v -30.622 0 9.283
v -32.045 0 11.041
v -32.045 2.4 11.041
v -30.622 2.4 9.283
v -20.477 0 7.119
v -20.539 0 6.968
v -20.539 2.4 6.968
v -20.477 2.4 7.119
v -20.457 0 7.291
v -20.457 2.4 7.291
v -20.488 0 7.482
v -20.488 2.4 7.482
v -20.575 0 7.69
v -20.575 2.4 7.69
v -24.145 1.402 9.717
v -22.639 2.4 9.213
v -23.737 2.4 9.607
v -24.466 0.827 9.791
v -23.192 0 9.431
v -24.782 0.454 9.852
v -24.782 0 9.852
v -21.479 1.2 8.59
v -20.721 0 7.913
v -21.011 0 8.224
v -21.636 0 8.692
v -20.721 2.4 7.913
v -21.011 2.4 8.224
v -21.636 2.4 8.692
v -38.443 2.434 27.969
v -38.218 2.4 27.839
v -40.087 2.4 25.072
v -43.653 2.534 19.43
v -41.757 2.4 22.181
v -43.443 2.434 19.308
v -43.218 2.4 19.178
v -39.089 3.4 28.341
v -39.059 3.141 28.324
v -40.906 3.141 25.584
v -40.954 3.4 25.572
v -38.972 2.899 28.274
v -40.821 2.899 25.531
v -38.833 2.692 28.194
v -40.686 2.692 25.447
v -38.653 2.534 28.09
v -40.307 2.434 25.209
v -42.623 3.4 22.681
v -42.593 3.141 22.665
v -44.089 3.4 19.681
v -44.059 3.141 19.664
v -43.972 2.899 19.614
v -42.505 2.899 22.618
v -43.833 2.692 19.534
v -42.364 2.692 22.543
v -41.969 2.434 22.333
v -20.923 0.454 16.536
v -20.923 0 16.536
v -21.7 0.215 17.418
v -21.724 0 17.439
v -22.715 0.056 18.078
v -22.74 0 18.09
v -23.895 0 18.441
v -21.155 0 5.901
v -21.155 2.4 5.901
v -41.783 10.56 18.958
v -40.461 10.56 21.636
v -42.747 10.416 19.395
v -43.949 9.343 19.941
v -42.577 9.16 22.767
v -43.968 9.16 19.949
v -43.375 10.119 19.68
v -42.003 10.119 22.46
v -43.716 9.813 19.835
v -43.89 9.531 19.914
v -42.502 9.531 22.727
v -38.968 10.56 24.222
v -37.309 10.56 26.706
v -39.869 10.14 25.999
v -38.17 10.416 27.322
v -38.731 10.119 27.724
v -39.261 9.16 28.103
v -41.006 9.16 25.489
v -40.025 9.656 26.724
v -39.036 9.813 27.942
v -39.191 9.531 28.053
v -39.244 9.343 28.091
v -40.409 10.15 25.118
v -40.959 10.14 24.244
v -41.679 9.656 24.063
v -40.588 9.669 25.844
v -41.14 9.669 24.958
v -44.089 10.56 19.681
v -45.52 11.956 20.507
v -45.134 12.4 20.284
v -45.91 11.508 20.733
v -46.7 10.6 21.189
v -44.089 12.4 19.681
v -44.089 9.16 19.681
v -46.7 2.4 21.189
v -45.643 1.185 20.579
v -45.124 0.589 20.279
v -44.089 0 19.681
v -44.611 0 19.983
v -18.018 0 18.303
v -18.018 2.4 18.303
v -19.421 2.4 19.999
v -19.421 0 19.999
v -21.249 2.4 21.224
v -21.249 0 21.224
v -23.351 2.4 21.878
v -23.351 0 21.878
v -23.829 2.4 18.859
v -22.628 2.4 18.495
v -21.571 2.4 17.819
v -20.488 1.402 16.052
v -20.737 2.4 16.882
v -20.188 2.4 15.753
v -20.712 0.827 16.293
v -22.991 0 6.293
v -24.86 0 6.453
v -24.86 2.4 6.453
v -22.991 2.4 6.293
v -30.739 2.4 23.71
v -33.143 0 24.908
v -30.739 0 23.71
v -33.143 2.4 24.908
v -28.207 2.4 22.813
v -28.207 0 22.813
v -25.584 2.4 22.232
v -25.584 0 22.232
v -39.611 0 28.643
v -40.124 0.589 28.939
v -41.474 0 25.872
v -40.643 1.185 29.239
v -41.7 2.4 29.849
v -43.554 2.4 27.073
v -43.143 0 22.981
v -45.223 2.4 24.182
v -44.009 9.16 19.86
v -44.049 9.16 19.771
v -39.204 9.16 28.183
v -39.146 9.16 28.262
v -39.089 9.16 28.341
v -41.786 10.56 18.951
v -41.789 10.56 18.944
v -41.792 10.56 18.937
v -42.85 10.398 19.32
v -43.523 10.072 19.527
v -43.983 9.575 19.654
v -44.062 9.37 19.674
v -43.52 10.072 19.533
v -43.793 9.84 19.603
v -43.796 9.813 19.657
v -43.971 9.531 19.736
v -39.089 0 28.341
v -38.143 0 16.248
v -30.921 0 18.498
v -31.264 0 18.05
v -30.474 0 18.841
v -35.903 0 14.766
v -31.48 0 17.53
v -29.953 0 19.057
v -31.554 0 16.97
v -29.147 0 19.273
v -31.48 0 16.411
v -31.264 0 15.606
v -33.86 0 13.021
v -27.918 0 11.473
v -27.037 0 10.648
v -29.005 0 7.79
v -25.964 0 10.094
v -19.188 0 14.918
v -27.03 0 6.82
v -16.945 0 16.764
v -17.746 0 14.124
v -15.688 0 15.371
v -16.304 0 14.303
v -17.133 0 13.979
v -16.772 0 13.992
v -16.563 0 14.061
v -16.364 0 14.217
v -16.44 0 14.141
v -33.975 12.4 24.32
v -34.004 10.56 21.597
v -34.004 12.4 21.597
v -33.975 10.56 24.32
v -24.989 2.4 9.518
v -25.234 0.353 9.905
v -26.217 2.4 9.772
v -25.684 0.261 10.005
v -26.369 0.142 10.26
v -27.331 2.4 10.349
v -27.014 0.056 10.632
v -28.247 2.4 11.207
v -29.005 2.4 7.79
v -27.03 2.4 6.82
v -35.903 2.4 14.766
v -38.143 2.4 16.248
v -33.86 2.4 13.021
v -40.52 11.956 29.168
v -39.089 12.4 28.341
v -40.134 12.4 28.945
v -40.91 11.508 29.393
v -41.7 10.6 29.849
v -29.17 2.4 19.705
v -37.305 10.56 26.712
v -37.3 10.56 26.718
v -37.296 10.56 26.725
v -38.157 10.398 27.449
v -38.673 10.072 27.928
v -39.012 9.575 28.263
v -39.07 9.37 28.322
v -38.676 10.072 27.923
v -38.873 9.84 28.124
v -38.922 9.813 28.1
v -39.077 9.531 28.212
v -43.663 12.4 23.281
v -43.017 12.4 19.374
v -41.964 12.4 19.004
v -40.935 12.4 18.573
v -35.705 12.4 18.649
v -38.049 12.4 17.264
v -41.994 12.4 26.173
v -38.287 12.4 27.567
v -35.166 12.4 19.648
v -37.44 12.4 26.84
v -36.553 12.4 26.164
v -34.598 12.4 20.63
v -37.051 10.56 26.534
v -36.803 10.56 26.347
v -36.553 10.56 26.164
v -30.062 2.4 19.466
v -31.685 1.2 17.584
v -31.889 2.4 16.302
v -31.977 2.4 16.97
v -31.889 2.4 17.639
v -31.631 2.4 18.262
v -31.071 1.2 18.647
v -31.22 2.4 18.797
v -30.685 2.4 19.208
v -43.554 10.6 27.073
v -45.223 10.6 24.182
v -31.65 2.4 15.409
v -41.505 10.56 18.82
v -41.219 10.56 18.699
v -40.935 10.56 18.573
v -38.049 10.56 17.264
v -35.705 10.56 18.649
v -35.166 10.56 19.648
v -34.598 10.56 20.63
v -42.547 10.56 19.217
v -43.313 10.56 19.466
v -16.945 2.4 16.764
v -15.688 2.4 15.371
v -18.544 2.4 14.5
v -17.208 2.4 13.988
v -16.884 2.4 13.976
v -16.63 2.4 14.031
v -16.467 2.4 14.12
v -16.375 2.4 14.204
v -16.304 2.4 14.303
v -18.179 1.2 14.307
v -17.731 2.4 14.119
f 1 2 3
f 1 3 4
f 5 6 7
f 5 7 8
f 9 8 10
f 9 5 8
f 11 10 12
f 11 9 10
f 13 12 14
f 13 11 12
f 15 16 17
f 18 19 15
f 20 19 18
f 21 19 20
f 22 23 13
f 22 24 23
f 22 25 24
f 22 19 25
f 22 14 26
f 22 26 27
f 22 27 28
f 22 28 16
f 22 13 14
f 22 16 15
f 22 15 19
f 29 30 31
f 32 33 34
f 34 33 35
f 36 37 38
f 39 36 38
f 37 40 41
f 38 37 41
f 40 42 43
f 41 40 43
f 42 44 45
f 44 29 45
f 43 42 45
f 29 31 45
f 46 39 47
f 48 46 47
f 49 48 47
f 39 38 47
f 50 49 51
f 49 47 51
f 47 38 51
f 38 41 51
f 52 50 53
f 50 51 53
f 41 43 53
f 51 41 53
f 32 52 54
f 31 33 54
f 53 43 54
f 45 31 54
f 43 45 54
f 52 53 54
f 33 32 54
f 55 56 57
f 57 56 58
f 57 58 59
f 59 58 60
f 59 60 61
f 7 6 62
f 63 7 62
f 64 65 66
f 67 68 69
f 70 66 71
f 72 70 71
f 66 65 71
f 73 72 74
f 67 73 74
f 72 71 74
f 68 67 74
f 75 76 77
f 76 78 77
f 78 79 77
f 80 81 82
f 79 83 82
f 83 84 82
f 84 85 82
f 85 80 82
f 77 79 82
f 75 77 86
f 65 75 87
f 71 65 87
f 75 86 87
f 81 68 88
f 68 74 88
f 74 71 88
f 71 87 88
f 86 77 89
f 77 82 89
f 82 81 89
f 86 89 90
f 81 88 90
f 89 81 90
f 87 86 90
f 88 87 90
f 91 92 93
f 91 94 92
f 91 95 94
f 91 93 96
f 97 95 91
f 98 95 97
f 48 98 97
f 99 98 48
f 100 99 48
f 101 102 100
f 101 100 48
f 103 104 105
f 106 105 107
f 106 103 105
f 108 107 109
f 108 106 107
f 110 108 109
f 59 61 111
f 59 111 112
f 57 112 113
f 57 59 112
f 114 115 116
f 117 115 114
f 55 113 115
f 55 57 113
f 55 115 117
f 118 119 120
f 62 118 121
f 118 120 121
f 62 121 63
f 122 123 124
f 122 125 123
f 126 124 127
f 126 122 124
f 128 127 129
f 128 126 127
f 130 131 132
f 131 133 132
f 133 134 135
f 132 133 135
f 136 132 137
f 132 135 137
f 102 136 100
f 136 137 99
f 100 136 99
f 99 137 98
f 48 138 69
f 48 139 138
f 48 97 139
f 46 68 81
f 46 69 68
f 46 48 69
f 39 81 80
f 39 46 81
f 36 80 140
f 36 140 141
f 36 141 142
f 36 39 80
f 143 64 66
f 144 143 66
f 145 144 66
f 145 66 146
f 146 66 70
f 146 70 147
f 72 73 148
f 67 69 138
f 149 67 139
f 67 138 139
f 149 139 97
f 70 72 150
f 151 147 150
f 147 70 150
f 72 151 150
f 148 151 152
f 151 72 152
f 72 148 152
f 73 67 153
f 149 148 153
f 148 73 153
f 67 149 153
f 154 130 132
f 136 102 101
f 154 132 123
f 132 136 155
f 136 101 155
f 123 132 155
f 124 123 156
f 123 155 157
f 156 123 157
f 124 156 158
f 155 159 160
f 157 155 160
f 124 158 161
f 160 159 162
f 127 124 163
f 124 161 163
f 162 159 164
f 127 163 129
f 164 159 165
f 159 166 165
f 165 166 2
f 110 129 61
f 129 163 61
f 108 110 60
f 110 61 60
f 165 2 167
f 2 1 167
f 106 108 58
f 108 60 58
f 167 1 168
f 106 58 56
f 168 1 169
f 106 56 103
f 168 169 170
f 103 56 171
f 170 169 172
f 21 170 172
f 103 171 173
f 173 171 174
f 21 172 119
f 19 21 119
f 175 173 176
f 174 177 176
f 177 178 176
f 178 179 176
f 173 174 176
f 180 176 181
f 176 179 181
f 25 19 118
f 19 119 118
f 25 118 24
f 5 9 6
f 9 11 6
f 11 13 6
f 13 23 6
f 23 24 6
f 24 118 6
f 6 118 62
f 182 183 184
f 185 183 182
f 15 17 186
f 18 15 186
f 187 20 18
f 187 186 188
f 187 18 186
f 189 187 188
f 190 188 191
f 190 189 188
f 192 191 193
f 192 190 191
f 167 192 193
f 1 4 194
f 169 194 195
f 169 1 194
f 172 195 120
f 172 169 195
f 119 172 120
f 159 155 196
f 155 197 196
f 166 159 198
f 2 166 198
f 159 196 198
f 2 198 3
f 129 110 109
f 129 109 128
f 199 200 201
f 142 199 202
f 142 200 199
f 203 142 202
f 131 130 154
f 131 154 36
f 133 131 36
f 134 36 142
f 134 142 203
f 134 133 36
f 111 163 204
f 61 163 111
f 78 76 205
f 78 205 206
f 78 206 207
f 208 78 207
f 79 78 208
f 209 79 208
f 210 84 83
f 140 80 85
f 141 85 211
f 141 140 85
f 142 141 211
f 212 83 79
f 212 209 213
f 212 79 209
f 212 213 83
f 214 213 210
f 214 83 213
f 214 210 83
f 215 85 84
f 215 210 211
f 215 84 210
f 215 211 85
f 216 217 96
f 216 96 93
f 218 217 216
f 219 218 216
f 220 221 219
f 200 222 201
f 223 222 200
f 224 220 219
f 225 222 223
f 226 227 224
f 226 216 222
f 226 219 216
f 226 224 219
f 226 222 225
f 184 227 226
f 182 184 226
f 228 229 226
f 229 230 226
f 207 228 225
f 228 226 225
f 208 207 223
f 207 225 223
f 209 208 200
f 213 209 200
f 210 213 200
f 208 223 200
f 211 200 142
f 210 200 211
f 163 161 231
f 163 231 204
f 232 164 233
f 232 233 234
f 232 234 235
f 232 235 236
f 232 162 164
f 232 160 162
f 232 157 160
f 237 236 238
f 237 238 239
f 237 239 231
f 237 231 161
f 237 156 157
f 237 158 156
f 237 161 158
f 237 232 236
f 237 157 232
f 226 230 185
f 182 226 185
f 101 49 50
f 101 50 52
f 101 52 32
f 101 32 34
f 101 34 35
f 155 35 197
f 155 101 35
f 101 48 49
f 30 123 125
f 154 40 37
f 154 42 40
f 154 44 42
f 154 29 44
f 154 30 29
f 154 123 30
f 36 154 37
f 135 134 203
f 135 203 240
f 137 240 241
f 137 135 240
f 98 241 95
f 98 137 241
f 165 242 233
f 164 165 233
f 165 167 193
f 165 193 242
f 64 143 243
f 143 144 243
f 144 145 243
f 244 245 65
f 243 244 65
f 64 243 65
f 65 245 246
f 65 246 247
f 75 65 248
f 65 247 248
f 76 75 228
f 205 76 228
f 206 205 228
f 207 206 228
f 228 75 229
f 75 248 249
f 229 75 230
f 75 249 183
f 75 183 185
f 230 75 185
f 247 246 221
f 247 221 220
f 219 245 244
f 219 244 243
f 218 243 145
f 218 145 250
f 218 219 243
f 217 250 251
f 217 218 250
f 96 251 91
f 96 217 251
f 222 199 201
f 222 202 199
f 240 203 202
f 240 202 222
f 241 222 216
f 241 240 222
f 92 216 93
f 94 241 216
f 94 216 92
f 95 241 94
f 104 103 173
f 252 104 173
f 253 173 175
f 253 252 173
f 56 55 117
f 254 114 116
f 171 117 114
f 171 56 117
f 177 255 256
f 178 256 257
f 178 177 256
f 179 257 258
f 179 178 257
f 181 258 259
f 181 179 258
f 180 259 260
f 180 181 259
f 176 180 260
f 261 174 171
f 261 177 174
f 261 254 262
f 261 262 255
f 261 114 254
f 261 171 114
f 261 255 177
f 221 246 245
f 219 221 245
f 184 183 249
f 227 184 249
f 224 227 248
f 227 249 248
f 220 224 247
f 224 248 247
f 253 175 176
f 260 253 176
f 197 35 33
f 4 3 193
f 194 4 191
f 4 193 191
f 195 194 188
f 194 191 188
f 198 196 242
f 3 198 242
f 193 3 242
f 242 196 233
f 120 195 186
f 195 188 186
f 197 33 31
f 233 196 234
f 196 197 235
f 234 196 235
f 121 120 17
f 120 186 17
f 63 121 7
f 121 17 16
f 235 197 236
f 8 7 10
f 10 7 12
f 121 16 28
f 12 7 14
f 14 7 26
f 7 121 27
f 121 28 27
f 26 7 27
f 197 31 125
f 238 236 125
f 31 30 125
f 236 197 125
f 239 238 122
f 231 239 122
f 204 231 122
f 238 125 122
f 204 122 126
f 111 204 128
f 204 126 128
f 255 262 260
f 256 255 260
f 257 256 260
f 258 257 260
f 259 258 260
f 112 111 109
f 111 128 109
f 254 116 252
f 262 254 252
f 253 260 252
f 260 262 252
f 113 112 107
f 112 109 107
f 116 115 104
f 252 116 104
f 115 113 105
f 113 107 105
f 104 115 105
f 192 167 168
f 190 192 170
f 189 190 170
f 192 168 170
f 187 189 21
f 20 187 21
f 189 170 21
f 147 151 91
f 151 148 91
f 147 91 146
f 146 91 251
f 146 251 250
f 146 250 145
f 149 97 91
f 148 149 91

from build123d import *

# Parameters (mm, degrees)
EXTRUDE_1_DEPTH     = 2.4
EXTRUDE_1_DRAFT     = 10
EXTRUDE_2_DEPTH     = 12.4
EXTRUDE_4_DEPTH     = 2.4
EXTRUDE_START       = -1.84
EXTRUDE_3_DEPTH     = 1.84
CHAMFER_1_SIZE      = 2.4
FILLET_3_R          = 1
FILLET_4_R          = 19
CHAMFER_2_SIZE      = 1.5
CHAMFER_3_SIZE      = 1.5
FILLET_5_SIZE       = 2.4
FILLET_5_SIZE_2     = 1.4
FILLET_8_R          = 15
CUT_EXTRUDE_2_DEPTH = 5
FILLET_6_DEPTH      = 2.4
FILLET_7_DEPTH      = 2.4
CHAMFER_4_SIZE      = 1.8
FILLET_9_R          = 22


with BuildPart() as part:
    # 草图1 → 凸台-拉伸1 (with draft: the straight prism first)
    with BuildSketch(Plane(origin=(0, 0, 0), x_dir=(1, 0, 0), z_dir=(0, 1, 0))):
        with BuildLine():
            Line((-8, -10.392304845), (-13, -1.732050808))
            Line((-13, -1.732050808), (-21.967816979, -6.909622355))
            Line((-21.967816979, -6.909622355), (-22.707395472, -6.711455524))
            ThreePointArc((-22.707395472, -6.711455524), (-27.045667208, -6.825066474), (-30.622176838, -9.283132374))
            Line((-30.622176838, -9.283132374), (-34.43427487, -13.990668154))
            Line((-34.43427487, -13.990668154), (-34.611399325, -14.209398026))
            Line((-34.611399325, -14.209398026), (-44.088841542, -19.681201841))
            ThreePointArc((-44.088841542, -19.681201841), (-41.813654956, -24.141124945), (-39.088841542, -28.341455878))
            Line((-39.088841542, -28.341455878), (-29.611399325, -22.869652063))
            Line((-29.611399325, -22.869652063), (-29.333411472, -22.825622721))
            Line((-29.333411472, -22.825622721), (-23.350516885, -21.878016874))
            ThreePointArc((-23.350516885, -21.878016874), (-19.433514554, -20.009701627), (-17.165988715, -16.309453567))
            Line((-17.165988715, -16.309453567), (-16.967816979, -15.569876393))
            Line((-16.967816979, -15.569876393), (-8, -10.392304845))
        make_face()
        with BuildLine():
            Line((-27.917710858, -11.473169763), (-31.264303283, -15.605855609))
            Line((-31.264303283, -15.605855609), (-31.480162481, -16.411447438))
            ThreePointArc((-31.480162481, -16.411447438), (-31.264379417, -18.05049777), (-29.952811807, -19.056896659))
            Line((-29.952811807, -19.056896659), (-29.147219046, -19.27275307))
            Line((-29.147219046, -19.27275307), (-23.894912088, -18.440861966))
            ThreePointArc((-23.894912088, -18.440861966), (-21.762087, -17.423555776), (-20.527408298, -15.408754734))
            Line((-20.527408298, -15.408754734), (-19.958845574, -13.286877913))
            ThreePointArc((-19.958845574, -13.286877913), (-20.174626779, -11.647826039), (-21.486196869, -10.641428268))
            Line((-21.486196869, -10.641428268), (-23.608077089, -10.07287972))
            ThreePointArc((-23.608077089, -10.07287972), (-25.97028529, -10.134742248), (-27.917710858, -11.473169763))
        make_face(mode=Mode.SUBTRACT)
    extrude(amount=EXTRUDE_1_DEPTH)
    # 凸台-拉伸1: the draft: its side faces are tilted about the plane it starts from
    extrude_1_sides = [part.faces().sort_by_distance(p)[0] for p in [
        (-26.480958105, 1.2, 22.373834469),
        (-29.59100707, 1.2, 13.539512686),
        (-31.372232882, 1.2, 16.008651523),
        (-31.264379417, 1.2, 18.05049777),
        (-29.550015427, 1.2, 19.164824864),
        (-26.521065567, 1.2, 18.856807518),
        (-21.762087, 1.2, 17.423555776),
        (-20.243126936, 1.2, 14.347816323),
        (-20.174626779, 1.2, 11.647826039),
        (-22.547136979, 1.2, 10.357153994),
        (-25.97028529, 1.2, 10.134742248),
        (-41.813654956, 1.2, 24.141124945),
        (-39.350120434, 1.2, 16.945299933),
        (-32.616788082, 1.2, 11.7462652),
        (-27.045667208, 1.2, 6.825066474),
        (-22.337606226, 1.2, 6.810538939),
        (-17.48390849, 1.2, 4.320836581),
        (-10.5, 1.2, 6.062177826),
        (-12.48390849, 1.2, 12.981090619),
        (-17.066902847, 1.2, 15.93966498),
        (-34.350120433, 1.2, 25.605553971),
        (-19.433514554, 1.2, 20.009701627),
    ]]
    draft(extrude_1_sides, Plane(origin=(0, 0, 0), x_dir=(1, 0, 0), z_dir=(0, 1, 0)), EXTRUDE_1_DRAFT)



with BuildPart() as body_2:
    # 草图3 → 凸台-拉伸2 (new body)
    with BuildSketch(Plane.XZ):
        with BuildLine():
            Line((-39.088841542, 28.341455878), (-41.700134223, 29.849086411))
            ThreePointArc((-41.700134223, 29.849086411), (-44.411731167, 25.641124945), (-46.700134223, 21.188832373))
            Line((-46.700134223, 21.188832373), (-44.088841542, 19.681201841))
            ThreePointArc((-44.088841542, 19.681201841), (-41.813654956, 24.141124945), (-39.088841542, 28.341455878))
        make_face()
    extrude(amount=-EXTRUDE_2_DEPTH)


with BuildPart() as part_1:
    add(part.part)

    add(body_2.part)  # 凸台-拉伸4 merges body 2
    # 草图2 → 凸台-拉伸4 (add)
    with BuildSketch(Plane.XZ):
        with BuildLine():
            Line((-13, 1.732050808), (-8, 10.392304845))
            Line((-8, 10.392304845), (-16.967816979, 15.569876393))
            Line((-16.967816979, 15.569876393), (-17.165988715, 16.309453567))
            ThreePointArc((-17.165988715, 16.309453567), (-19.433514554, 20.009701627), (-23.350516885, 21.878016874))
            Line((-23.350516885, 21.878016874), (-29.611399325, 22.869652063))
            Line((-29.611399325, 22.869652063), (-39.088841542, 28.341455878))
            ThreePointArc((-39.088841542, 28.341455878), (-41.813654956, 24.141124945), (-44.088841542, 19.681201841))
            Line((-44.088841542, 19.681201841), (-34.611399325, 14.209398026))
            Line((-34.611399325, 14.209398026), (-30.622176838, 9.283132374))
            ThreePointArc((-30.622176838, 9.283132374), (-27.045667208, 6.825066474), (-22.707395472, 6.711455524))
            Line((-22.707395472, 6.711455524), (-21.967816979, 6.909622355))
            Line((-21.967816979, 6.909622355), (-13, 1.732050808))
        make_face()
        Polygon((-28.267922288, 9.695660603), (-32.994912051, 15.569876392), (-31.812956682, 19.594100966), (-26.346816011, 20.919608689), (-19.040272004, 17.121163853), (-18.489608424, 9.956624946), (-26.72941961, 8.295337377), align=None, mode=Mode.SUBTRACT)
    extrude(amount=-EXTRUDE_4_DEPTH)

    # 草图4 → 凸台-拉伸3 (add)
    with BuildSketch(Plane(origin=(0, 12.4, 0), x_dir=(1, 0, 0), z_dir=(0, 1, 0)).offset(EXTRUDE_START)):
        with BuildLine():
            Line((-36.682994227, -16.643845431), (-46.700134223, -21.188832373))
            ThreePointArc((-46.700134223, -21.188832373), (-44.411731167, -25.641124945), (-41.700134223, -29.849086411))
            Line((-41.700134223, -29.849086411), (-32.755490073, -23.446482172))
            ThreePointArc((-32.755490073, -23.446482172), (-34.885451726, -20.141124945), (-36.682994227, -16.643845431))
        make_face()
    extrude(amount=EXTRUDE_3_DEPTH)

    # 倒角1
    chamfer_1_edges = [part_1.edges().sort_by_distance(p)[0] for p in [
        (-44.411731167, 0, 25.641124945),
    ]]
    chamfer(chamfer_1_edges, length=CHAMFER_1_SIZE)

    # 圆角3
    fillet_3_edges = [part_1.edges().sort_by_distance(p)[0] for p in [
        (-41.813654956, 2.4, 24.141124945),
    ]]
    fillet(fillet_3_edges, radius=FILLET_3_R)

    # 圆角4
    # the kernel refuses this fillet: 19 mm, written as the material it adds along each edge
    with BuildSketch(Plane(origin=(-39.260685818, 12.4, 28.102921618), x_dir=(0.5845278463012991, 0, 0.8113736481414496), z_dir=(0, -1, 0))) as fillet_4_piece_1:
        with BuildLine():
            CenterArc((19.010051021, -3.272459571), FILLET_4_R, 170.082224445, 10.092211377)
            Line((0.010139075, -3.33030459), (0, 0))
            ThreePointArc((0, 0), (0.146994089, 0.00022376), (0.293988178, 0))
        make_face()
    extrude(amount=1.84)
    with BuildSketch(Plane(origin=(-43.968186951, 12.4, 19.949290479), x_dir=(-0.4104062681012657, 0, -0.9119027881869821), z_dir=(0, -1, 0))) as fillet_4_piece_2:
        with BuildLine():
            CenterArc((19.010051021, 3.272459571), FILLET_4_R, 179.825564179, 10.092211377)
            Line((0.010139075, 3.33030459), (0, 0))
            ThreePointArc((0, 0), (0.146994089, -0.00022376), (0.293988178, 0))
        make_face()
    extrude(amount=1.84)

    # 倒角2
    # the kernel refuses this chamfer: 2.14222201, 1.5 mm, written as the material it takes off along each edge
    with BuildSketch(Plane(origin=(-36.682994227, 4.801632278, 16.643845431), x_dir=(-0.910649090537952, 0, 0.4131806310833085), z_dir=(0, 1, 0))) as chamfer_2_piece_1:
        with BuildLine():
            Line((CHAMFER_2_SIZE, 0), (-0.061799745, 2.230481193))
            ThreePointArc((-0.061799745, 2.230481193), (-0.016460271, 1.151452368), (0, 0))
            Line((0, 0), (CHAMFER_2_SIZE, 0))
        make_face()
    extrude(amount=13.356735445, mode=Mode.SUBTRACT)

    # 倒角3
    # the kernel refuses this chamfer: 2.14222201, 1.5 mm, written as the material it takes off along each edge
    with BuildSketch(Plane(origin=(-32.755490073, 4.801632278, 23.446482172), x_dir=(-0.5593104278121883, 0, -0.8289582892646329), z_dir=(0, 1, 0))) as chamfer_3_piece_1:
        with BuildLine():
            Line((2.231337169, 0), (-CHAMFER_3_SIZE * 0.0276962827921, CHAMFER_3_SIZE * 0.999616384379))
            Line((-CHAMFER_3_SIZE * 0.0276962827921, CHAMFER_3_SIZE * 0.999616384379), (0, 0))
            ThreePointArc((0, 0), (1.151466541, 0.015436994), (2.231337169, 0))
        make_face()
    extrude(amount=13.356735445, mode=Mode.SUBTRACT)

    # 圆角5
    # a fillet whose section is not a circle: 2.4, 1.4 mm, written as the material it adds along each edge
    with BuildSketch(Plane(origin=(0, 10.56, 0), x_dir=(-0.8131494681386953, 0, 0.582054930797564), z_dir=(0.582054930797564, 0, 0.8131494681386953))) as fillet_5_piece_1:
        with BuildLine():
            Bezier((48.282249889 - FILLET_5_SIZE, 0), (48.282249889, 0), (48.282249889, FILLET_5_SIZE_2), weights=[1, 0.707106781, 1])
            Line((48.282249889, FILLET_5_SIZE_2), (48.282249889, 0))
            Line((48.282249889, 0), (48.282249889 - FILLET_5_SIZE, 0))
        make_face()
    revolve(axis=Axis((0, 10.56, 0), (0, -1, 0)), revolution_arc=11.190411394)
    with BuildSketch(Plane(origin=(-6e-08, 10.56, 4.3e-08), x_dir=(-0.8131494681413899, 0, 0.5820549307937993), z_dir=(-0.5820549307937993, 0, -0.8131494681413899))) as fillet_5_piece_2_section:
        with BuildLine():
            Bezier((48.282249815 - FILLET_5_SIZE, 0), (48.282249815, 0), (48.282249815, -FILLET_5_SIZE_2), weights=[1, 0.707106781, 1])
            Line((48.282249815, -FILLET_5_SIZE_2), (48.282249815, 0))
            Line((48.282249815, 0), (48.282249815 - FILLET_5_SIZE, 0))
        make_face()
    fillet_5_piece_2 = revolve(axis=Axis((-6e-08, 10.56, 4.3e-08), (0, 1, 0)), revolution_arc=7.468976453, mode=Mode.PRIVATE)
    fillet_5_piece_2 = fillet_5_piece_2 - Plane(origin=(-25.493594176, 10.56, 41.614332321), x_dir=(0.5845278463013154, 0, 0.8113736481414379), z_dir=(0, 1, 0)) * Cylinder(19, 194, mode=Mode.PRIVATE)
    add(fillet_5_piece_2)
    with BuildSketch(Plane(origin=(-6.8e-08, 10.56, 3e-08), x_dir=(-0.9106490905361394, 0, 0.4131806310873032), z_dir=(0.4131806310873032, 0, 0.9106490905361394))) as fillet_5_piece_3_section:
        with BuildLine():
            Bezier((48.282249815 - FILLET_5_SIZE, 0), (48.282249815, 0), (48.282249815, FILLET_5_SIZE_2), weights=[1, 0.707106781, 1])
            Line((48.282249815, FILLET_5_SIZE_2), (48.282249815, 0))
            Line((48.282249815, 0), (48.282249815 - FILLET_5_SIZE, 0))
        make_face()
    fillet_5_piece_3 = revolve(axis=Axis((-6.8e-08, 10.56, 3e-08), (0, -1, 0)), revolution_arc=7.468976453, mode=Mode.PRIVATE)
    fillet_5_piece_3 = fillet_5_piece_3 - Plane(origin=(-48.78586604, 10.56, 1.27093403), x_dir=(-0.4104062681010381, 0, -0.9119027881870846), z_dir=(0, 1, 0)) * Cylinder(19, 194, mode=Mode.PRIVATE)
    add(fillet_5_piece_3)

    # 圆角8
    fillet_8_edges = [part_1.edges().sort_by_distance(p)[0] for p in [
        (-16.967816979, 1.2, 15.569876393),
        (-21.967816979, 1.2, 6.909622355),
    ]]
    fillet(fillet_8_edges, radius=FILLET_8_R)

    # 草图5 → 切除-拉伸2 (cut)
    with BuildSketch(Plane.XZ):
        with BuildLine():
            Line((-29.147219046, 19.27275307), (-31.264303283, 15.605855609))
            Line((-31.264303283, 15.605855609), (-27.917710858, 11.473169763))
            ThreePointArc((-27.917710858, 11.473169763), (-26.519580592, 10.33421548), (-24.781854923, 9.852245982))
            ThreePointArc((-24.781854923, 9.852245982), (-22.061802465, 9.586923289), (-19.411053684, 8.921632073))
            Line((-19.411053684, 8.921632073), (-21.155274081, 5.900553727))
            Line((-21.155274081, 5.900553727), (-15.208253994, -4.420406035))
            Line((-15.208253994, -4.420406035), (0.192169605, 10.177783302))
            Line((0.192169605, 10.177783302), (-15.687666464, 15.370727914))
            Line((-15.687666464, 15.370727914), (-17.431886861, 12.349649567))
            ThreePointArc((-17.431886861, 12.349649567), (-19.333420345, 14.312619743), (-20.923222766, 16.535592924))
            ThreePointArc((-20.923222766, 16.535592924), (-22.209483528, 17.799522767), (-23.894912088, 18.440861966))
            Line((-23.894912088, 18.440861966), (-29.147219046, 19.27275307))
        make_face()
    extrude(amount=-CUT_EXTRUDE_2_DEPTH, mode=Mode.SUBTRACT)

    # 圆角6: read off the stored shape, not the designer's step
    # 圆角6 outline → 圆角6 (cut)
    with BuildSketch(Plane(origin=(0, 0, 0), x_dir=(1, 0, 0), z_dir=(0, 1, 0))):
        with BuildLine():
            Line((-19.411053684, -8.921632073), (-20.538770468, -6.968369307))
            add(Edge.make_bspline(
                [(-20.538770468, -6.968369307), (-19.421581423, -8.903397494), (-24.781854923, -9.852245982)],
                knots=[0, 0, 0, 1, 1, 1], degree=2, weights=[1, 0.573849647, 1]))
            ThreePointArc((-24.781854923, -9.852245982), (-22.061802466, -9.586923289), (-19.411053684, -8.921632073))
        make_face()
    extrude(amount=FILLET_6_DEPTH, mode=Mode.SUBTRACT)

    # 圆角7: read off the stored shape, not the designer's step
    # 圆角7 outline → 圆角7 (cut)
    with BuildSketch(Plane(origin=(0, 0, 0), x_dir=(1, 0, 0), z_dir=(0, 1, 0))):
        with BuildLine():
            ThreePointArc((-17.431886861, -12.349649567), (-19.333420346, -14.312619744), (-20.923222767, -16.535592926))
            add(Edge.make_bspline(
                [(-20.923222767, -16.535592926), (-17.421359117, -12.367884155), (-16.304170077, -14.302912333)],
                knots=[0, 0, 0, 1, 1, 1], degree=2, weights=[1, 0.573849648, 1]))
            Line((-16.304170077, -14.302912333), (-17.431886861, -12.349649567))
        make_face()
    extrude(amount=FILLET_7_DEPTH, mode=Mode.SUBTRACT)

    # 倒角4
    chamfer_4_edges = [part_1.edges().sort_by_distance(p)[0] for p in [
        (-44.411731167, 12.4, 25.641124945),
    ]]
    chamfer(chamfer_4_edges, length=CHAMFER_4_SIZE)

    # 圆角9
    fillet_9_edges = [part_1.edges().sort_by_distance(p)[0] for p in [
        (-34.611399325, 1.2, 14.209398026),
        (-29.611399325, 1.2, 22.869652063),
    ]]
    fillet(fillet_9_edges, radius=FILLET_9_R)


solid = part_1.part
